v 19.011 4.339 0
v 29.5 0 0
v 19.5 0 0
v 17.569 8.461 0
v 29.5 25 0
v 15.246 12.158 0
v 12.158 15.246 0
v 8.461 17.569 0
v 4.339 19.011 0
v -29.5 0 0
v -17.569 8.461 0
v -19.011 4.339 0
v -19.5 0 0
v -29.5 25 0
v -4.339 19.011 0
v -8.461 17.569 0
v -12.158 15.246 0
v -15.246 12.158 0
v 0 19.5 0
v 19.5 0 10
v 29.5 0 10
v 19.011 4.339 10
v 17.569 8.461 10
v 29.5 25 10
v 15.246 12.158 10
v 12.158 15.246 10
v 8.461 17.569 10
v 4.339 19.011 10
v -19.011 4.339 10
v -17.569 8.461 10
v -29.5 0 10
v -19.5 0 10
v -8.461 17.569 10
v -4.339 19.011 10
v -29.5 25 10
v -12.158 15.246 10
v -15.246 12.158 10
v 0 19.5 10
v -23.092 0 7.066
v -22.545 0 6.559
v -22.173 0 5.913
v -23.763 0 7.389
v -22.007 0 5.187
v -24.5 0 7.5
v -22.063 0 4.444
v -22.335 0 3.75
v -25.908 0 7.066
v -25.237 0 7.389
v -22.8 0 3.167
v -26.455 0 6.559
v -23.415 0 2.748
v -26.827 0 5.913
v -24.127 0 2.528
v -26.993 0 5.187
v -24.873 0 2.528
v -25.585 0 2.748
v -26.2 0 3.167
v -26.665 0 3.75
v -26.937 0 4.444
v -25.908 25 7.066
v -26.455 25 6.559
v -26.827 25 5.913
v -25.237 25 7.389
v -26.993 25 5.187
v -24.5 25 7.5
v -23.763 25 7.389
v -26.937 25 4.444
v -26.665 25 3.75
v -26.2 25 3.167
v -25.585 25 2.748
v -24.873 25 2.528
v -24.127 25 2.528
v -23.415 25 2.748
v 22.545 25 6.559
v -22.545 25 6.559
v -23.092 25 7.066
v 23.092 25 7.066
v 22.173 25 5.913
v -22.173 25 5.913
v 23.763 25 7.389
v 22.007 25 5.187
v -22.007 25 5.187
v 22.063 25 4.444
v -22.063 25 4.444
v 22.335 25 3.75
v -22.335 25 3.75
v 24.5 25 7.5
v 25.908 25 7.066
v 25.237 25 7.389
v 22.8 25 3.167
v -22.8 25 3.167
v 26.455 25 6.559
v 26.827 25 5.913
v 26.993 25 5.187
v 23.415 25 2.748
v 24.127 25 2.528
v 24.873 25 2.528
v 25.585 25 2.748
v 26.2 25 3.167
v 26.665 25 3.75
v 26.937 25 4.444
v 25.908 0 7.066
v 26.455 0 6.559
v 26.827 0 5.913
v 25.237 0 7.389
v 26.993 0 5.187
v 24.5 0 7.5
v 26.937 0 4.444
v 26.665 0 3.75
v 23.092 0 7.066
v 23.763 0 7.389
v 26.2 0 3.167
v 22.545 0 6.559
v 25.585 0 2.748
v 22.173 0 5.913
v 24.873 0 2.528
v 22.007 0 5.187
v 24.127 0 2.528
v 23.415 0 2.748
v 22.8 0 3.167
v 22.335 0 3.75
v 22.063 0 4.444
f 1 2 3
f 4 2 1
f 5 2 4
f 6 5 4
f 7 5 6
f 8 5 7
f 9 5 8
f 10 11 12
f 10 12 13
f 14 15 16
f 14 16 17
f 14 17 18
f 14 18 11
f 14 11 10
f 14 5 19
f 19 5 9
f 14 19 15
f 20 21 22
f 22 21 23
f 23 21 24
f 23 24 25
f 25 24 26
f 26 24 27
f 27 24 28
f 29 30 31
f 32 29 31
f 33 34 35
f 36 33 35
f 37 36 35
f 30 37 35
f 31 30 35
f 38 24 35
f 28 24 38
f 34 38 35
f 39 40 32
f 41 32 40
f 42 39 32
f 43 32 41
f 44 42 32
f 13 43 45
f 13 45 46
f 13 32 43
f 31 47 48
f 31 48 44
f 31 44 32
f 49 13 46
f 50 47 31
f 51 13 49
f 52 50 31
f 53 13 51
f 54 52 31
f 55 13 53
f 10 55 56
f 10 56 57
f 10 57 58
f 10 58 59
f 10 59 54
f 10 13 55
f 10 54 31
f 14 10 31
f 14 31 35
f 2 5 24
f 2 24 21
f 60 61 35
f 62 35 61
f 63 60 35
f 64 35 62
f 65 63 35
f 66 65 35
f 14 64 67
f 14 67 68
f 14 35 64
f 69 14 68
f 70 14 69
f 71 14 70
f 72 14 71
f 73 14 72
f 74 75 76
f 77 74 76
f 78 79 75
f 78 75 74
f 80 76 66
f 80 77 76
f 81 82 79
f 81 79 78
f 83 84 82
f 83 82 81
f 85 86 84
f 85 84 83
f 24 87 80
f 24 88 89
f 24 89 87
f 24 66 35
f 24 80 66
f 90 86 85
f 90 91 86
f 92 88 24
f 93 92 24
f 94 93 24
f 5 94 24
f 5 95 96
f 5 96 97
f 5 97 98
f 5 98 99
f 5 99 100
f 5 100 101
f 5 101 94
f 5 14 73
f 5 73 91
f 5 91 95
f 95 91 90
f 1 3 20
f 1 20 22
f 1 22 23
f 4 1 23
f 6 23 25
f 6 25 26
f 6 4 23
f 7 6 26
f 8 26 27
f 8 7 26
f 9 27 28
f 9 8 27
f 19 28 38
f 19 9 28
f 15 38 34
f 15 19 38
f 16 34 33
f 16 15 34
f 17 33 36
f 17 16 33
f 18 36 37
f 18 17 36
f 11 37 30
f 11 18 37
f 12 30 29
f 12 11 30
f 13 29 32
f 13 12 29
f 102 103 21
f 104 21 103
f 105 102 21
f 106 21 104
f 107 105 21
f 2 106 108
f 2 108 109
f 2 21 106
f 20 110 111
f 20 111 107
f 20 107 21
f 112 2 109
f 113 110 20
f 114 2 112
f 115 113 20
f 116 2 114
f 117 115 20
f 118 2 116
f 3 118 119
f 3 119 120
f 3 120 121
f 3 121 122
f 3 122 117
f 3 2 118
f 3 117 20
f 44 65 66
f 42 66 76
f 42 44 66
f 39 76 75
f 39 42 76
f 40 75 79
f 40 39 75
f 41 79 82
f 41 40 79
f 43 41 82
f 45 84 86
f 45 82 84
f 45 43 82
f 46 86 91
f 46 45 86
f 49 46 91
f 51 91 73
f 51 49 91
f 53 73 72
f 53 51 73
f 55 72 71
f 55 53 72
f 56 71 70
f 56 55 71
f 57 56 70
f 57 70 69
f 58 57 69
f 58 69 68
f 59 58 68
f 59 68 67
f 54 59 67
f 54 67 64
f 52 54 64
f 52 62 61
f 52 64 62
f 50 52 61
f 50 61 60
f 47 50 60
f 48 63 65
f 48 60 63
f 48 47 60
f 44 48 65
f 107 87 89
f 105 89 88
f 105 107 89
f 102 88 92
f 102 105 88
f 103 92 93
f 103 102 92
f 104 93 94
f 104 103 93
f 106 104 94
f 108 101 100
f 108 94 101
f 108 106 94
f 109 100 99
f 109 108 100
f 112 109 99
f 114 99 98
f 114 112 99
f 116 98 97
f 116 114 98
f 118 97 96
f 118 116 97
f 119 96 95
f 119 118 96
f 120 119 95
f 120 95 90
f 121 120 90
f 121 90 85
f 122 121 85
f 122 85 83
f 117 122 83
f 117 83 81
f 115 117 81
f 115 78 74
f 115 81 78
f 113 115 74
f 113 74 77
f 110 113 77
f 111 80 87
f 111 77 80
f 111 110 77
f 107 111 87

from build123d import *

# Parameters (mm, degrees)
BOSS_EXTRUDE1_DEPTH = 10
SKETCH2_R           = 2.5
CUT_EXTRUDE2_DEPTH  = 40.940580867


with BuildPart() as part:
    # Sketch1 → Boss-Extrude1 (new body)
    with BuildSketch(Plane.XY):
        with BuildLine():
            Line((-19.5, 0), (-29.5, 0))
            Line((-29.5, 0), (-29.5, 25))
            Line((-29.5, 25), (29.5, 25))
            Line((29.5, 25), (29.5, 0))
            Line((29.5, 0), (19.5, 0))
            ThreePointArc((19.5, 0), (0, 19.5), (-19.5, 0))
        make_face()
    extrude(amount=BOSS_EXTRUDE1_DEPTH)

    # Sketch2 → Cut-Extrude2 (cut, through all)
    with BuildSketch(Plane(origin=(0, 0, 0), x_dir=(1, 0, 0), z_dir=(0, 1, 0))):
        with Locations(Location((-24.5, -5, 0), (0, 0, 270))):
            Circle(SKETCH2_R)
        with Locations(Location((24.5, -5, 0), (0, 0, 270))):
            Circle(SKETCH2_R)
    extrude(amount=CUT_EXTRUDE2_DEPTH, mode=Mode.SUBTRACT)


solid = part.part
